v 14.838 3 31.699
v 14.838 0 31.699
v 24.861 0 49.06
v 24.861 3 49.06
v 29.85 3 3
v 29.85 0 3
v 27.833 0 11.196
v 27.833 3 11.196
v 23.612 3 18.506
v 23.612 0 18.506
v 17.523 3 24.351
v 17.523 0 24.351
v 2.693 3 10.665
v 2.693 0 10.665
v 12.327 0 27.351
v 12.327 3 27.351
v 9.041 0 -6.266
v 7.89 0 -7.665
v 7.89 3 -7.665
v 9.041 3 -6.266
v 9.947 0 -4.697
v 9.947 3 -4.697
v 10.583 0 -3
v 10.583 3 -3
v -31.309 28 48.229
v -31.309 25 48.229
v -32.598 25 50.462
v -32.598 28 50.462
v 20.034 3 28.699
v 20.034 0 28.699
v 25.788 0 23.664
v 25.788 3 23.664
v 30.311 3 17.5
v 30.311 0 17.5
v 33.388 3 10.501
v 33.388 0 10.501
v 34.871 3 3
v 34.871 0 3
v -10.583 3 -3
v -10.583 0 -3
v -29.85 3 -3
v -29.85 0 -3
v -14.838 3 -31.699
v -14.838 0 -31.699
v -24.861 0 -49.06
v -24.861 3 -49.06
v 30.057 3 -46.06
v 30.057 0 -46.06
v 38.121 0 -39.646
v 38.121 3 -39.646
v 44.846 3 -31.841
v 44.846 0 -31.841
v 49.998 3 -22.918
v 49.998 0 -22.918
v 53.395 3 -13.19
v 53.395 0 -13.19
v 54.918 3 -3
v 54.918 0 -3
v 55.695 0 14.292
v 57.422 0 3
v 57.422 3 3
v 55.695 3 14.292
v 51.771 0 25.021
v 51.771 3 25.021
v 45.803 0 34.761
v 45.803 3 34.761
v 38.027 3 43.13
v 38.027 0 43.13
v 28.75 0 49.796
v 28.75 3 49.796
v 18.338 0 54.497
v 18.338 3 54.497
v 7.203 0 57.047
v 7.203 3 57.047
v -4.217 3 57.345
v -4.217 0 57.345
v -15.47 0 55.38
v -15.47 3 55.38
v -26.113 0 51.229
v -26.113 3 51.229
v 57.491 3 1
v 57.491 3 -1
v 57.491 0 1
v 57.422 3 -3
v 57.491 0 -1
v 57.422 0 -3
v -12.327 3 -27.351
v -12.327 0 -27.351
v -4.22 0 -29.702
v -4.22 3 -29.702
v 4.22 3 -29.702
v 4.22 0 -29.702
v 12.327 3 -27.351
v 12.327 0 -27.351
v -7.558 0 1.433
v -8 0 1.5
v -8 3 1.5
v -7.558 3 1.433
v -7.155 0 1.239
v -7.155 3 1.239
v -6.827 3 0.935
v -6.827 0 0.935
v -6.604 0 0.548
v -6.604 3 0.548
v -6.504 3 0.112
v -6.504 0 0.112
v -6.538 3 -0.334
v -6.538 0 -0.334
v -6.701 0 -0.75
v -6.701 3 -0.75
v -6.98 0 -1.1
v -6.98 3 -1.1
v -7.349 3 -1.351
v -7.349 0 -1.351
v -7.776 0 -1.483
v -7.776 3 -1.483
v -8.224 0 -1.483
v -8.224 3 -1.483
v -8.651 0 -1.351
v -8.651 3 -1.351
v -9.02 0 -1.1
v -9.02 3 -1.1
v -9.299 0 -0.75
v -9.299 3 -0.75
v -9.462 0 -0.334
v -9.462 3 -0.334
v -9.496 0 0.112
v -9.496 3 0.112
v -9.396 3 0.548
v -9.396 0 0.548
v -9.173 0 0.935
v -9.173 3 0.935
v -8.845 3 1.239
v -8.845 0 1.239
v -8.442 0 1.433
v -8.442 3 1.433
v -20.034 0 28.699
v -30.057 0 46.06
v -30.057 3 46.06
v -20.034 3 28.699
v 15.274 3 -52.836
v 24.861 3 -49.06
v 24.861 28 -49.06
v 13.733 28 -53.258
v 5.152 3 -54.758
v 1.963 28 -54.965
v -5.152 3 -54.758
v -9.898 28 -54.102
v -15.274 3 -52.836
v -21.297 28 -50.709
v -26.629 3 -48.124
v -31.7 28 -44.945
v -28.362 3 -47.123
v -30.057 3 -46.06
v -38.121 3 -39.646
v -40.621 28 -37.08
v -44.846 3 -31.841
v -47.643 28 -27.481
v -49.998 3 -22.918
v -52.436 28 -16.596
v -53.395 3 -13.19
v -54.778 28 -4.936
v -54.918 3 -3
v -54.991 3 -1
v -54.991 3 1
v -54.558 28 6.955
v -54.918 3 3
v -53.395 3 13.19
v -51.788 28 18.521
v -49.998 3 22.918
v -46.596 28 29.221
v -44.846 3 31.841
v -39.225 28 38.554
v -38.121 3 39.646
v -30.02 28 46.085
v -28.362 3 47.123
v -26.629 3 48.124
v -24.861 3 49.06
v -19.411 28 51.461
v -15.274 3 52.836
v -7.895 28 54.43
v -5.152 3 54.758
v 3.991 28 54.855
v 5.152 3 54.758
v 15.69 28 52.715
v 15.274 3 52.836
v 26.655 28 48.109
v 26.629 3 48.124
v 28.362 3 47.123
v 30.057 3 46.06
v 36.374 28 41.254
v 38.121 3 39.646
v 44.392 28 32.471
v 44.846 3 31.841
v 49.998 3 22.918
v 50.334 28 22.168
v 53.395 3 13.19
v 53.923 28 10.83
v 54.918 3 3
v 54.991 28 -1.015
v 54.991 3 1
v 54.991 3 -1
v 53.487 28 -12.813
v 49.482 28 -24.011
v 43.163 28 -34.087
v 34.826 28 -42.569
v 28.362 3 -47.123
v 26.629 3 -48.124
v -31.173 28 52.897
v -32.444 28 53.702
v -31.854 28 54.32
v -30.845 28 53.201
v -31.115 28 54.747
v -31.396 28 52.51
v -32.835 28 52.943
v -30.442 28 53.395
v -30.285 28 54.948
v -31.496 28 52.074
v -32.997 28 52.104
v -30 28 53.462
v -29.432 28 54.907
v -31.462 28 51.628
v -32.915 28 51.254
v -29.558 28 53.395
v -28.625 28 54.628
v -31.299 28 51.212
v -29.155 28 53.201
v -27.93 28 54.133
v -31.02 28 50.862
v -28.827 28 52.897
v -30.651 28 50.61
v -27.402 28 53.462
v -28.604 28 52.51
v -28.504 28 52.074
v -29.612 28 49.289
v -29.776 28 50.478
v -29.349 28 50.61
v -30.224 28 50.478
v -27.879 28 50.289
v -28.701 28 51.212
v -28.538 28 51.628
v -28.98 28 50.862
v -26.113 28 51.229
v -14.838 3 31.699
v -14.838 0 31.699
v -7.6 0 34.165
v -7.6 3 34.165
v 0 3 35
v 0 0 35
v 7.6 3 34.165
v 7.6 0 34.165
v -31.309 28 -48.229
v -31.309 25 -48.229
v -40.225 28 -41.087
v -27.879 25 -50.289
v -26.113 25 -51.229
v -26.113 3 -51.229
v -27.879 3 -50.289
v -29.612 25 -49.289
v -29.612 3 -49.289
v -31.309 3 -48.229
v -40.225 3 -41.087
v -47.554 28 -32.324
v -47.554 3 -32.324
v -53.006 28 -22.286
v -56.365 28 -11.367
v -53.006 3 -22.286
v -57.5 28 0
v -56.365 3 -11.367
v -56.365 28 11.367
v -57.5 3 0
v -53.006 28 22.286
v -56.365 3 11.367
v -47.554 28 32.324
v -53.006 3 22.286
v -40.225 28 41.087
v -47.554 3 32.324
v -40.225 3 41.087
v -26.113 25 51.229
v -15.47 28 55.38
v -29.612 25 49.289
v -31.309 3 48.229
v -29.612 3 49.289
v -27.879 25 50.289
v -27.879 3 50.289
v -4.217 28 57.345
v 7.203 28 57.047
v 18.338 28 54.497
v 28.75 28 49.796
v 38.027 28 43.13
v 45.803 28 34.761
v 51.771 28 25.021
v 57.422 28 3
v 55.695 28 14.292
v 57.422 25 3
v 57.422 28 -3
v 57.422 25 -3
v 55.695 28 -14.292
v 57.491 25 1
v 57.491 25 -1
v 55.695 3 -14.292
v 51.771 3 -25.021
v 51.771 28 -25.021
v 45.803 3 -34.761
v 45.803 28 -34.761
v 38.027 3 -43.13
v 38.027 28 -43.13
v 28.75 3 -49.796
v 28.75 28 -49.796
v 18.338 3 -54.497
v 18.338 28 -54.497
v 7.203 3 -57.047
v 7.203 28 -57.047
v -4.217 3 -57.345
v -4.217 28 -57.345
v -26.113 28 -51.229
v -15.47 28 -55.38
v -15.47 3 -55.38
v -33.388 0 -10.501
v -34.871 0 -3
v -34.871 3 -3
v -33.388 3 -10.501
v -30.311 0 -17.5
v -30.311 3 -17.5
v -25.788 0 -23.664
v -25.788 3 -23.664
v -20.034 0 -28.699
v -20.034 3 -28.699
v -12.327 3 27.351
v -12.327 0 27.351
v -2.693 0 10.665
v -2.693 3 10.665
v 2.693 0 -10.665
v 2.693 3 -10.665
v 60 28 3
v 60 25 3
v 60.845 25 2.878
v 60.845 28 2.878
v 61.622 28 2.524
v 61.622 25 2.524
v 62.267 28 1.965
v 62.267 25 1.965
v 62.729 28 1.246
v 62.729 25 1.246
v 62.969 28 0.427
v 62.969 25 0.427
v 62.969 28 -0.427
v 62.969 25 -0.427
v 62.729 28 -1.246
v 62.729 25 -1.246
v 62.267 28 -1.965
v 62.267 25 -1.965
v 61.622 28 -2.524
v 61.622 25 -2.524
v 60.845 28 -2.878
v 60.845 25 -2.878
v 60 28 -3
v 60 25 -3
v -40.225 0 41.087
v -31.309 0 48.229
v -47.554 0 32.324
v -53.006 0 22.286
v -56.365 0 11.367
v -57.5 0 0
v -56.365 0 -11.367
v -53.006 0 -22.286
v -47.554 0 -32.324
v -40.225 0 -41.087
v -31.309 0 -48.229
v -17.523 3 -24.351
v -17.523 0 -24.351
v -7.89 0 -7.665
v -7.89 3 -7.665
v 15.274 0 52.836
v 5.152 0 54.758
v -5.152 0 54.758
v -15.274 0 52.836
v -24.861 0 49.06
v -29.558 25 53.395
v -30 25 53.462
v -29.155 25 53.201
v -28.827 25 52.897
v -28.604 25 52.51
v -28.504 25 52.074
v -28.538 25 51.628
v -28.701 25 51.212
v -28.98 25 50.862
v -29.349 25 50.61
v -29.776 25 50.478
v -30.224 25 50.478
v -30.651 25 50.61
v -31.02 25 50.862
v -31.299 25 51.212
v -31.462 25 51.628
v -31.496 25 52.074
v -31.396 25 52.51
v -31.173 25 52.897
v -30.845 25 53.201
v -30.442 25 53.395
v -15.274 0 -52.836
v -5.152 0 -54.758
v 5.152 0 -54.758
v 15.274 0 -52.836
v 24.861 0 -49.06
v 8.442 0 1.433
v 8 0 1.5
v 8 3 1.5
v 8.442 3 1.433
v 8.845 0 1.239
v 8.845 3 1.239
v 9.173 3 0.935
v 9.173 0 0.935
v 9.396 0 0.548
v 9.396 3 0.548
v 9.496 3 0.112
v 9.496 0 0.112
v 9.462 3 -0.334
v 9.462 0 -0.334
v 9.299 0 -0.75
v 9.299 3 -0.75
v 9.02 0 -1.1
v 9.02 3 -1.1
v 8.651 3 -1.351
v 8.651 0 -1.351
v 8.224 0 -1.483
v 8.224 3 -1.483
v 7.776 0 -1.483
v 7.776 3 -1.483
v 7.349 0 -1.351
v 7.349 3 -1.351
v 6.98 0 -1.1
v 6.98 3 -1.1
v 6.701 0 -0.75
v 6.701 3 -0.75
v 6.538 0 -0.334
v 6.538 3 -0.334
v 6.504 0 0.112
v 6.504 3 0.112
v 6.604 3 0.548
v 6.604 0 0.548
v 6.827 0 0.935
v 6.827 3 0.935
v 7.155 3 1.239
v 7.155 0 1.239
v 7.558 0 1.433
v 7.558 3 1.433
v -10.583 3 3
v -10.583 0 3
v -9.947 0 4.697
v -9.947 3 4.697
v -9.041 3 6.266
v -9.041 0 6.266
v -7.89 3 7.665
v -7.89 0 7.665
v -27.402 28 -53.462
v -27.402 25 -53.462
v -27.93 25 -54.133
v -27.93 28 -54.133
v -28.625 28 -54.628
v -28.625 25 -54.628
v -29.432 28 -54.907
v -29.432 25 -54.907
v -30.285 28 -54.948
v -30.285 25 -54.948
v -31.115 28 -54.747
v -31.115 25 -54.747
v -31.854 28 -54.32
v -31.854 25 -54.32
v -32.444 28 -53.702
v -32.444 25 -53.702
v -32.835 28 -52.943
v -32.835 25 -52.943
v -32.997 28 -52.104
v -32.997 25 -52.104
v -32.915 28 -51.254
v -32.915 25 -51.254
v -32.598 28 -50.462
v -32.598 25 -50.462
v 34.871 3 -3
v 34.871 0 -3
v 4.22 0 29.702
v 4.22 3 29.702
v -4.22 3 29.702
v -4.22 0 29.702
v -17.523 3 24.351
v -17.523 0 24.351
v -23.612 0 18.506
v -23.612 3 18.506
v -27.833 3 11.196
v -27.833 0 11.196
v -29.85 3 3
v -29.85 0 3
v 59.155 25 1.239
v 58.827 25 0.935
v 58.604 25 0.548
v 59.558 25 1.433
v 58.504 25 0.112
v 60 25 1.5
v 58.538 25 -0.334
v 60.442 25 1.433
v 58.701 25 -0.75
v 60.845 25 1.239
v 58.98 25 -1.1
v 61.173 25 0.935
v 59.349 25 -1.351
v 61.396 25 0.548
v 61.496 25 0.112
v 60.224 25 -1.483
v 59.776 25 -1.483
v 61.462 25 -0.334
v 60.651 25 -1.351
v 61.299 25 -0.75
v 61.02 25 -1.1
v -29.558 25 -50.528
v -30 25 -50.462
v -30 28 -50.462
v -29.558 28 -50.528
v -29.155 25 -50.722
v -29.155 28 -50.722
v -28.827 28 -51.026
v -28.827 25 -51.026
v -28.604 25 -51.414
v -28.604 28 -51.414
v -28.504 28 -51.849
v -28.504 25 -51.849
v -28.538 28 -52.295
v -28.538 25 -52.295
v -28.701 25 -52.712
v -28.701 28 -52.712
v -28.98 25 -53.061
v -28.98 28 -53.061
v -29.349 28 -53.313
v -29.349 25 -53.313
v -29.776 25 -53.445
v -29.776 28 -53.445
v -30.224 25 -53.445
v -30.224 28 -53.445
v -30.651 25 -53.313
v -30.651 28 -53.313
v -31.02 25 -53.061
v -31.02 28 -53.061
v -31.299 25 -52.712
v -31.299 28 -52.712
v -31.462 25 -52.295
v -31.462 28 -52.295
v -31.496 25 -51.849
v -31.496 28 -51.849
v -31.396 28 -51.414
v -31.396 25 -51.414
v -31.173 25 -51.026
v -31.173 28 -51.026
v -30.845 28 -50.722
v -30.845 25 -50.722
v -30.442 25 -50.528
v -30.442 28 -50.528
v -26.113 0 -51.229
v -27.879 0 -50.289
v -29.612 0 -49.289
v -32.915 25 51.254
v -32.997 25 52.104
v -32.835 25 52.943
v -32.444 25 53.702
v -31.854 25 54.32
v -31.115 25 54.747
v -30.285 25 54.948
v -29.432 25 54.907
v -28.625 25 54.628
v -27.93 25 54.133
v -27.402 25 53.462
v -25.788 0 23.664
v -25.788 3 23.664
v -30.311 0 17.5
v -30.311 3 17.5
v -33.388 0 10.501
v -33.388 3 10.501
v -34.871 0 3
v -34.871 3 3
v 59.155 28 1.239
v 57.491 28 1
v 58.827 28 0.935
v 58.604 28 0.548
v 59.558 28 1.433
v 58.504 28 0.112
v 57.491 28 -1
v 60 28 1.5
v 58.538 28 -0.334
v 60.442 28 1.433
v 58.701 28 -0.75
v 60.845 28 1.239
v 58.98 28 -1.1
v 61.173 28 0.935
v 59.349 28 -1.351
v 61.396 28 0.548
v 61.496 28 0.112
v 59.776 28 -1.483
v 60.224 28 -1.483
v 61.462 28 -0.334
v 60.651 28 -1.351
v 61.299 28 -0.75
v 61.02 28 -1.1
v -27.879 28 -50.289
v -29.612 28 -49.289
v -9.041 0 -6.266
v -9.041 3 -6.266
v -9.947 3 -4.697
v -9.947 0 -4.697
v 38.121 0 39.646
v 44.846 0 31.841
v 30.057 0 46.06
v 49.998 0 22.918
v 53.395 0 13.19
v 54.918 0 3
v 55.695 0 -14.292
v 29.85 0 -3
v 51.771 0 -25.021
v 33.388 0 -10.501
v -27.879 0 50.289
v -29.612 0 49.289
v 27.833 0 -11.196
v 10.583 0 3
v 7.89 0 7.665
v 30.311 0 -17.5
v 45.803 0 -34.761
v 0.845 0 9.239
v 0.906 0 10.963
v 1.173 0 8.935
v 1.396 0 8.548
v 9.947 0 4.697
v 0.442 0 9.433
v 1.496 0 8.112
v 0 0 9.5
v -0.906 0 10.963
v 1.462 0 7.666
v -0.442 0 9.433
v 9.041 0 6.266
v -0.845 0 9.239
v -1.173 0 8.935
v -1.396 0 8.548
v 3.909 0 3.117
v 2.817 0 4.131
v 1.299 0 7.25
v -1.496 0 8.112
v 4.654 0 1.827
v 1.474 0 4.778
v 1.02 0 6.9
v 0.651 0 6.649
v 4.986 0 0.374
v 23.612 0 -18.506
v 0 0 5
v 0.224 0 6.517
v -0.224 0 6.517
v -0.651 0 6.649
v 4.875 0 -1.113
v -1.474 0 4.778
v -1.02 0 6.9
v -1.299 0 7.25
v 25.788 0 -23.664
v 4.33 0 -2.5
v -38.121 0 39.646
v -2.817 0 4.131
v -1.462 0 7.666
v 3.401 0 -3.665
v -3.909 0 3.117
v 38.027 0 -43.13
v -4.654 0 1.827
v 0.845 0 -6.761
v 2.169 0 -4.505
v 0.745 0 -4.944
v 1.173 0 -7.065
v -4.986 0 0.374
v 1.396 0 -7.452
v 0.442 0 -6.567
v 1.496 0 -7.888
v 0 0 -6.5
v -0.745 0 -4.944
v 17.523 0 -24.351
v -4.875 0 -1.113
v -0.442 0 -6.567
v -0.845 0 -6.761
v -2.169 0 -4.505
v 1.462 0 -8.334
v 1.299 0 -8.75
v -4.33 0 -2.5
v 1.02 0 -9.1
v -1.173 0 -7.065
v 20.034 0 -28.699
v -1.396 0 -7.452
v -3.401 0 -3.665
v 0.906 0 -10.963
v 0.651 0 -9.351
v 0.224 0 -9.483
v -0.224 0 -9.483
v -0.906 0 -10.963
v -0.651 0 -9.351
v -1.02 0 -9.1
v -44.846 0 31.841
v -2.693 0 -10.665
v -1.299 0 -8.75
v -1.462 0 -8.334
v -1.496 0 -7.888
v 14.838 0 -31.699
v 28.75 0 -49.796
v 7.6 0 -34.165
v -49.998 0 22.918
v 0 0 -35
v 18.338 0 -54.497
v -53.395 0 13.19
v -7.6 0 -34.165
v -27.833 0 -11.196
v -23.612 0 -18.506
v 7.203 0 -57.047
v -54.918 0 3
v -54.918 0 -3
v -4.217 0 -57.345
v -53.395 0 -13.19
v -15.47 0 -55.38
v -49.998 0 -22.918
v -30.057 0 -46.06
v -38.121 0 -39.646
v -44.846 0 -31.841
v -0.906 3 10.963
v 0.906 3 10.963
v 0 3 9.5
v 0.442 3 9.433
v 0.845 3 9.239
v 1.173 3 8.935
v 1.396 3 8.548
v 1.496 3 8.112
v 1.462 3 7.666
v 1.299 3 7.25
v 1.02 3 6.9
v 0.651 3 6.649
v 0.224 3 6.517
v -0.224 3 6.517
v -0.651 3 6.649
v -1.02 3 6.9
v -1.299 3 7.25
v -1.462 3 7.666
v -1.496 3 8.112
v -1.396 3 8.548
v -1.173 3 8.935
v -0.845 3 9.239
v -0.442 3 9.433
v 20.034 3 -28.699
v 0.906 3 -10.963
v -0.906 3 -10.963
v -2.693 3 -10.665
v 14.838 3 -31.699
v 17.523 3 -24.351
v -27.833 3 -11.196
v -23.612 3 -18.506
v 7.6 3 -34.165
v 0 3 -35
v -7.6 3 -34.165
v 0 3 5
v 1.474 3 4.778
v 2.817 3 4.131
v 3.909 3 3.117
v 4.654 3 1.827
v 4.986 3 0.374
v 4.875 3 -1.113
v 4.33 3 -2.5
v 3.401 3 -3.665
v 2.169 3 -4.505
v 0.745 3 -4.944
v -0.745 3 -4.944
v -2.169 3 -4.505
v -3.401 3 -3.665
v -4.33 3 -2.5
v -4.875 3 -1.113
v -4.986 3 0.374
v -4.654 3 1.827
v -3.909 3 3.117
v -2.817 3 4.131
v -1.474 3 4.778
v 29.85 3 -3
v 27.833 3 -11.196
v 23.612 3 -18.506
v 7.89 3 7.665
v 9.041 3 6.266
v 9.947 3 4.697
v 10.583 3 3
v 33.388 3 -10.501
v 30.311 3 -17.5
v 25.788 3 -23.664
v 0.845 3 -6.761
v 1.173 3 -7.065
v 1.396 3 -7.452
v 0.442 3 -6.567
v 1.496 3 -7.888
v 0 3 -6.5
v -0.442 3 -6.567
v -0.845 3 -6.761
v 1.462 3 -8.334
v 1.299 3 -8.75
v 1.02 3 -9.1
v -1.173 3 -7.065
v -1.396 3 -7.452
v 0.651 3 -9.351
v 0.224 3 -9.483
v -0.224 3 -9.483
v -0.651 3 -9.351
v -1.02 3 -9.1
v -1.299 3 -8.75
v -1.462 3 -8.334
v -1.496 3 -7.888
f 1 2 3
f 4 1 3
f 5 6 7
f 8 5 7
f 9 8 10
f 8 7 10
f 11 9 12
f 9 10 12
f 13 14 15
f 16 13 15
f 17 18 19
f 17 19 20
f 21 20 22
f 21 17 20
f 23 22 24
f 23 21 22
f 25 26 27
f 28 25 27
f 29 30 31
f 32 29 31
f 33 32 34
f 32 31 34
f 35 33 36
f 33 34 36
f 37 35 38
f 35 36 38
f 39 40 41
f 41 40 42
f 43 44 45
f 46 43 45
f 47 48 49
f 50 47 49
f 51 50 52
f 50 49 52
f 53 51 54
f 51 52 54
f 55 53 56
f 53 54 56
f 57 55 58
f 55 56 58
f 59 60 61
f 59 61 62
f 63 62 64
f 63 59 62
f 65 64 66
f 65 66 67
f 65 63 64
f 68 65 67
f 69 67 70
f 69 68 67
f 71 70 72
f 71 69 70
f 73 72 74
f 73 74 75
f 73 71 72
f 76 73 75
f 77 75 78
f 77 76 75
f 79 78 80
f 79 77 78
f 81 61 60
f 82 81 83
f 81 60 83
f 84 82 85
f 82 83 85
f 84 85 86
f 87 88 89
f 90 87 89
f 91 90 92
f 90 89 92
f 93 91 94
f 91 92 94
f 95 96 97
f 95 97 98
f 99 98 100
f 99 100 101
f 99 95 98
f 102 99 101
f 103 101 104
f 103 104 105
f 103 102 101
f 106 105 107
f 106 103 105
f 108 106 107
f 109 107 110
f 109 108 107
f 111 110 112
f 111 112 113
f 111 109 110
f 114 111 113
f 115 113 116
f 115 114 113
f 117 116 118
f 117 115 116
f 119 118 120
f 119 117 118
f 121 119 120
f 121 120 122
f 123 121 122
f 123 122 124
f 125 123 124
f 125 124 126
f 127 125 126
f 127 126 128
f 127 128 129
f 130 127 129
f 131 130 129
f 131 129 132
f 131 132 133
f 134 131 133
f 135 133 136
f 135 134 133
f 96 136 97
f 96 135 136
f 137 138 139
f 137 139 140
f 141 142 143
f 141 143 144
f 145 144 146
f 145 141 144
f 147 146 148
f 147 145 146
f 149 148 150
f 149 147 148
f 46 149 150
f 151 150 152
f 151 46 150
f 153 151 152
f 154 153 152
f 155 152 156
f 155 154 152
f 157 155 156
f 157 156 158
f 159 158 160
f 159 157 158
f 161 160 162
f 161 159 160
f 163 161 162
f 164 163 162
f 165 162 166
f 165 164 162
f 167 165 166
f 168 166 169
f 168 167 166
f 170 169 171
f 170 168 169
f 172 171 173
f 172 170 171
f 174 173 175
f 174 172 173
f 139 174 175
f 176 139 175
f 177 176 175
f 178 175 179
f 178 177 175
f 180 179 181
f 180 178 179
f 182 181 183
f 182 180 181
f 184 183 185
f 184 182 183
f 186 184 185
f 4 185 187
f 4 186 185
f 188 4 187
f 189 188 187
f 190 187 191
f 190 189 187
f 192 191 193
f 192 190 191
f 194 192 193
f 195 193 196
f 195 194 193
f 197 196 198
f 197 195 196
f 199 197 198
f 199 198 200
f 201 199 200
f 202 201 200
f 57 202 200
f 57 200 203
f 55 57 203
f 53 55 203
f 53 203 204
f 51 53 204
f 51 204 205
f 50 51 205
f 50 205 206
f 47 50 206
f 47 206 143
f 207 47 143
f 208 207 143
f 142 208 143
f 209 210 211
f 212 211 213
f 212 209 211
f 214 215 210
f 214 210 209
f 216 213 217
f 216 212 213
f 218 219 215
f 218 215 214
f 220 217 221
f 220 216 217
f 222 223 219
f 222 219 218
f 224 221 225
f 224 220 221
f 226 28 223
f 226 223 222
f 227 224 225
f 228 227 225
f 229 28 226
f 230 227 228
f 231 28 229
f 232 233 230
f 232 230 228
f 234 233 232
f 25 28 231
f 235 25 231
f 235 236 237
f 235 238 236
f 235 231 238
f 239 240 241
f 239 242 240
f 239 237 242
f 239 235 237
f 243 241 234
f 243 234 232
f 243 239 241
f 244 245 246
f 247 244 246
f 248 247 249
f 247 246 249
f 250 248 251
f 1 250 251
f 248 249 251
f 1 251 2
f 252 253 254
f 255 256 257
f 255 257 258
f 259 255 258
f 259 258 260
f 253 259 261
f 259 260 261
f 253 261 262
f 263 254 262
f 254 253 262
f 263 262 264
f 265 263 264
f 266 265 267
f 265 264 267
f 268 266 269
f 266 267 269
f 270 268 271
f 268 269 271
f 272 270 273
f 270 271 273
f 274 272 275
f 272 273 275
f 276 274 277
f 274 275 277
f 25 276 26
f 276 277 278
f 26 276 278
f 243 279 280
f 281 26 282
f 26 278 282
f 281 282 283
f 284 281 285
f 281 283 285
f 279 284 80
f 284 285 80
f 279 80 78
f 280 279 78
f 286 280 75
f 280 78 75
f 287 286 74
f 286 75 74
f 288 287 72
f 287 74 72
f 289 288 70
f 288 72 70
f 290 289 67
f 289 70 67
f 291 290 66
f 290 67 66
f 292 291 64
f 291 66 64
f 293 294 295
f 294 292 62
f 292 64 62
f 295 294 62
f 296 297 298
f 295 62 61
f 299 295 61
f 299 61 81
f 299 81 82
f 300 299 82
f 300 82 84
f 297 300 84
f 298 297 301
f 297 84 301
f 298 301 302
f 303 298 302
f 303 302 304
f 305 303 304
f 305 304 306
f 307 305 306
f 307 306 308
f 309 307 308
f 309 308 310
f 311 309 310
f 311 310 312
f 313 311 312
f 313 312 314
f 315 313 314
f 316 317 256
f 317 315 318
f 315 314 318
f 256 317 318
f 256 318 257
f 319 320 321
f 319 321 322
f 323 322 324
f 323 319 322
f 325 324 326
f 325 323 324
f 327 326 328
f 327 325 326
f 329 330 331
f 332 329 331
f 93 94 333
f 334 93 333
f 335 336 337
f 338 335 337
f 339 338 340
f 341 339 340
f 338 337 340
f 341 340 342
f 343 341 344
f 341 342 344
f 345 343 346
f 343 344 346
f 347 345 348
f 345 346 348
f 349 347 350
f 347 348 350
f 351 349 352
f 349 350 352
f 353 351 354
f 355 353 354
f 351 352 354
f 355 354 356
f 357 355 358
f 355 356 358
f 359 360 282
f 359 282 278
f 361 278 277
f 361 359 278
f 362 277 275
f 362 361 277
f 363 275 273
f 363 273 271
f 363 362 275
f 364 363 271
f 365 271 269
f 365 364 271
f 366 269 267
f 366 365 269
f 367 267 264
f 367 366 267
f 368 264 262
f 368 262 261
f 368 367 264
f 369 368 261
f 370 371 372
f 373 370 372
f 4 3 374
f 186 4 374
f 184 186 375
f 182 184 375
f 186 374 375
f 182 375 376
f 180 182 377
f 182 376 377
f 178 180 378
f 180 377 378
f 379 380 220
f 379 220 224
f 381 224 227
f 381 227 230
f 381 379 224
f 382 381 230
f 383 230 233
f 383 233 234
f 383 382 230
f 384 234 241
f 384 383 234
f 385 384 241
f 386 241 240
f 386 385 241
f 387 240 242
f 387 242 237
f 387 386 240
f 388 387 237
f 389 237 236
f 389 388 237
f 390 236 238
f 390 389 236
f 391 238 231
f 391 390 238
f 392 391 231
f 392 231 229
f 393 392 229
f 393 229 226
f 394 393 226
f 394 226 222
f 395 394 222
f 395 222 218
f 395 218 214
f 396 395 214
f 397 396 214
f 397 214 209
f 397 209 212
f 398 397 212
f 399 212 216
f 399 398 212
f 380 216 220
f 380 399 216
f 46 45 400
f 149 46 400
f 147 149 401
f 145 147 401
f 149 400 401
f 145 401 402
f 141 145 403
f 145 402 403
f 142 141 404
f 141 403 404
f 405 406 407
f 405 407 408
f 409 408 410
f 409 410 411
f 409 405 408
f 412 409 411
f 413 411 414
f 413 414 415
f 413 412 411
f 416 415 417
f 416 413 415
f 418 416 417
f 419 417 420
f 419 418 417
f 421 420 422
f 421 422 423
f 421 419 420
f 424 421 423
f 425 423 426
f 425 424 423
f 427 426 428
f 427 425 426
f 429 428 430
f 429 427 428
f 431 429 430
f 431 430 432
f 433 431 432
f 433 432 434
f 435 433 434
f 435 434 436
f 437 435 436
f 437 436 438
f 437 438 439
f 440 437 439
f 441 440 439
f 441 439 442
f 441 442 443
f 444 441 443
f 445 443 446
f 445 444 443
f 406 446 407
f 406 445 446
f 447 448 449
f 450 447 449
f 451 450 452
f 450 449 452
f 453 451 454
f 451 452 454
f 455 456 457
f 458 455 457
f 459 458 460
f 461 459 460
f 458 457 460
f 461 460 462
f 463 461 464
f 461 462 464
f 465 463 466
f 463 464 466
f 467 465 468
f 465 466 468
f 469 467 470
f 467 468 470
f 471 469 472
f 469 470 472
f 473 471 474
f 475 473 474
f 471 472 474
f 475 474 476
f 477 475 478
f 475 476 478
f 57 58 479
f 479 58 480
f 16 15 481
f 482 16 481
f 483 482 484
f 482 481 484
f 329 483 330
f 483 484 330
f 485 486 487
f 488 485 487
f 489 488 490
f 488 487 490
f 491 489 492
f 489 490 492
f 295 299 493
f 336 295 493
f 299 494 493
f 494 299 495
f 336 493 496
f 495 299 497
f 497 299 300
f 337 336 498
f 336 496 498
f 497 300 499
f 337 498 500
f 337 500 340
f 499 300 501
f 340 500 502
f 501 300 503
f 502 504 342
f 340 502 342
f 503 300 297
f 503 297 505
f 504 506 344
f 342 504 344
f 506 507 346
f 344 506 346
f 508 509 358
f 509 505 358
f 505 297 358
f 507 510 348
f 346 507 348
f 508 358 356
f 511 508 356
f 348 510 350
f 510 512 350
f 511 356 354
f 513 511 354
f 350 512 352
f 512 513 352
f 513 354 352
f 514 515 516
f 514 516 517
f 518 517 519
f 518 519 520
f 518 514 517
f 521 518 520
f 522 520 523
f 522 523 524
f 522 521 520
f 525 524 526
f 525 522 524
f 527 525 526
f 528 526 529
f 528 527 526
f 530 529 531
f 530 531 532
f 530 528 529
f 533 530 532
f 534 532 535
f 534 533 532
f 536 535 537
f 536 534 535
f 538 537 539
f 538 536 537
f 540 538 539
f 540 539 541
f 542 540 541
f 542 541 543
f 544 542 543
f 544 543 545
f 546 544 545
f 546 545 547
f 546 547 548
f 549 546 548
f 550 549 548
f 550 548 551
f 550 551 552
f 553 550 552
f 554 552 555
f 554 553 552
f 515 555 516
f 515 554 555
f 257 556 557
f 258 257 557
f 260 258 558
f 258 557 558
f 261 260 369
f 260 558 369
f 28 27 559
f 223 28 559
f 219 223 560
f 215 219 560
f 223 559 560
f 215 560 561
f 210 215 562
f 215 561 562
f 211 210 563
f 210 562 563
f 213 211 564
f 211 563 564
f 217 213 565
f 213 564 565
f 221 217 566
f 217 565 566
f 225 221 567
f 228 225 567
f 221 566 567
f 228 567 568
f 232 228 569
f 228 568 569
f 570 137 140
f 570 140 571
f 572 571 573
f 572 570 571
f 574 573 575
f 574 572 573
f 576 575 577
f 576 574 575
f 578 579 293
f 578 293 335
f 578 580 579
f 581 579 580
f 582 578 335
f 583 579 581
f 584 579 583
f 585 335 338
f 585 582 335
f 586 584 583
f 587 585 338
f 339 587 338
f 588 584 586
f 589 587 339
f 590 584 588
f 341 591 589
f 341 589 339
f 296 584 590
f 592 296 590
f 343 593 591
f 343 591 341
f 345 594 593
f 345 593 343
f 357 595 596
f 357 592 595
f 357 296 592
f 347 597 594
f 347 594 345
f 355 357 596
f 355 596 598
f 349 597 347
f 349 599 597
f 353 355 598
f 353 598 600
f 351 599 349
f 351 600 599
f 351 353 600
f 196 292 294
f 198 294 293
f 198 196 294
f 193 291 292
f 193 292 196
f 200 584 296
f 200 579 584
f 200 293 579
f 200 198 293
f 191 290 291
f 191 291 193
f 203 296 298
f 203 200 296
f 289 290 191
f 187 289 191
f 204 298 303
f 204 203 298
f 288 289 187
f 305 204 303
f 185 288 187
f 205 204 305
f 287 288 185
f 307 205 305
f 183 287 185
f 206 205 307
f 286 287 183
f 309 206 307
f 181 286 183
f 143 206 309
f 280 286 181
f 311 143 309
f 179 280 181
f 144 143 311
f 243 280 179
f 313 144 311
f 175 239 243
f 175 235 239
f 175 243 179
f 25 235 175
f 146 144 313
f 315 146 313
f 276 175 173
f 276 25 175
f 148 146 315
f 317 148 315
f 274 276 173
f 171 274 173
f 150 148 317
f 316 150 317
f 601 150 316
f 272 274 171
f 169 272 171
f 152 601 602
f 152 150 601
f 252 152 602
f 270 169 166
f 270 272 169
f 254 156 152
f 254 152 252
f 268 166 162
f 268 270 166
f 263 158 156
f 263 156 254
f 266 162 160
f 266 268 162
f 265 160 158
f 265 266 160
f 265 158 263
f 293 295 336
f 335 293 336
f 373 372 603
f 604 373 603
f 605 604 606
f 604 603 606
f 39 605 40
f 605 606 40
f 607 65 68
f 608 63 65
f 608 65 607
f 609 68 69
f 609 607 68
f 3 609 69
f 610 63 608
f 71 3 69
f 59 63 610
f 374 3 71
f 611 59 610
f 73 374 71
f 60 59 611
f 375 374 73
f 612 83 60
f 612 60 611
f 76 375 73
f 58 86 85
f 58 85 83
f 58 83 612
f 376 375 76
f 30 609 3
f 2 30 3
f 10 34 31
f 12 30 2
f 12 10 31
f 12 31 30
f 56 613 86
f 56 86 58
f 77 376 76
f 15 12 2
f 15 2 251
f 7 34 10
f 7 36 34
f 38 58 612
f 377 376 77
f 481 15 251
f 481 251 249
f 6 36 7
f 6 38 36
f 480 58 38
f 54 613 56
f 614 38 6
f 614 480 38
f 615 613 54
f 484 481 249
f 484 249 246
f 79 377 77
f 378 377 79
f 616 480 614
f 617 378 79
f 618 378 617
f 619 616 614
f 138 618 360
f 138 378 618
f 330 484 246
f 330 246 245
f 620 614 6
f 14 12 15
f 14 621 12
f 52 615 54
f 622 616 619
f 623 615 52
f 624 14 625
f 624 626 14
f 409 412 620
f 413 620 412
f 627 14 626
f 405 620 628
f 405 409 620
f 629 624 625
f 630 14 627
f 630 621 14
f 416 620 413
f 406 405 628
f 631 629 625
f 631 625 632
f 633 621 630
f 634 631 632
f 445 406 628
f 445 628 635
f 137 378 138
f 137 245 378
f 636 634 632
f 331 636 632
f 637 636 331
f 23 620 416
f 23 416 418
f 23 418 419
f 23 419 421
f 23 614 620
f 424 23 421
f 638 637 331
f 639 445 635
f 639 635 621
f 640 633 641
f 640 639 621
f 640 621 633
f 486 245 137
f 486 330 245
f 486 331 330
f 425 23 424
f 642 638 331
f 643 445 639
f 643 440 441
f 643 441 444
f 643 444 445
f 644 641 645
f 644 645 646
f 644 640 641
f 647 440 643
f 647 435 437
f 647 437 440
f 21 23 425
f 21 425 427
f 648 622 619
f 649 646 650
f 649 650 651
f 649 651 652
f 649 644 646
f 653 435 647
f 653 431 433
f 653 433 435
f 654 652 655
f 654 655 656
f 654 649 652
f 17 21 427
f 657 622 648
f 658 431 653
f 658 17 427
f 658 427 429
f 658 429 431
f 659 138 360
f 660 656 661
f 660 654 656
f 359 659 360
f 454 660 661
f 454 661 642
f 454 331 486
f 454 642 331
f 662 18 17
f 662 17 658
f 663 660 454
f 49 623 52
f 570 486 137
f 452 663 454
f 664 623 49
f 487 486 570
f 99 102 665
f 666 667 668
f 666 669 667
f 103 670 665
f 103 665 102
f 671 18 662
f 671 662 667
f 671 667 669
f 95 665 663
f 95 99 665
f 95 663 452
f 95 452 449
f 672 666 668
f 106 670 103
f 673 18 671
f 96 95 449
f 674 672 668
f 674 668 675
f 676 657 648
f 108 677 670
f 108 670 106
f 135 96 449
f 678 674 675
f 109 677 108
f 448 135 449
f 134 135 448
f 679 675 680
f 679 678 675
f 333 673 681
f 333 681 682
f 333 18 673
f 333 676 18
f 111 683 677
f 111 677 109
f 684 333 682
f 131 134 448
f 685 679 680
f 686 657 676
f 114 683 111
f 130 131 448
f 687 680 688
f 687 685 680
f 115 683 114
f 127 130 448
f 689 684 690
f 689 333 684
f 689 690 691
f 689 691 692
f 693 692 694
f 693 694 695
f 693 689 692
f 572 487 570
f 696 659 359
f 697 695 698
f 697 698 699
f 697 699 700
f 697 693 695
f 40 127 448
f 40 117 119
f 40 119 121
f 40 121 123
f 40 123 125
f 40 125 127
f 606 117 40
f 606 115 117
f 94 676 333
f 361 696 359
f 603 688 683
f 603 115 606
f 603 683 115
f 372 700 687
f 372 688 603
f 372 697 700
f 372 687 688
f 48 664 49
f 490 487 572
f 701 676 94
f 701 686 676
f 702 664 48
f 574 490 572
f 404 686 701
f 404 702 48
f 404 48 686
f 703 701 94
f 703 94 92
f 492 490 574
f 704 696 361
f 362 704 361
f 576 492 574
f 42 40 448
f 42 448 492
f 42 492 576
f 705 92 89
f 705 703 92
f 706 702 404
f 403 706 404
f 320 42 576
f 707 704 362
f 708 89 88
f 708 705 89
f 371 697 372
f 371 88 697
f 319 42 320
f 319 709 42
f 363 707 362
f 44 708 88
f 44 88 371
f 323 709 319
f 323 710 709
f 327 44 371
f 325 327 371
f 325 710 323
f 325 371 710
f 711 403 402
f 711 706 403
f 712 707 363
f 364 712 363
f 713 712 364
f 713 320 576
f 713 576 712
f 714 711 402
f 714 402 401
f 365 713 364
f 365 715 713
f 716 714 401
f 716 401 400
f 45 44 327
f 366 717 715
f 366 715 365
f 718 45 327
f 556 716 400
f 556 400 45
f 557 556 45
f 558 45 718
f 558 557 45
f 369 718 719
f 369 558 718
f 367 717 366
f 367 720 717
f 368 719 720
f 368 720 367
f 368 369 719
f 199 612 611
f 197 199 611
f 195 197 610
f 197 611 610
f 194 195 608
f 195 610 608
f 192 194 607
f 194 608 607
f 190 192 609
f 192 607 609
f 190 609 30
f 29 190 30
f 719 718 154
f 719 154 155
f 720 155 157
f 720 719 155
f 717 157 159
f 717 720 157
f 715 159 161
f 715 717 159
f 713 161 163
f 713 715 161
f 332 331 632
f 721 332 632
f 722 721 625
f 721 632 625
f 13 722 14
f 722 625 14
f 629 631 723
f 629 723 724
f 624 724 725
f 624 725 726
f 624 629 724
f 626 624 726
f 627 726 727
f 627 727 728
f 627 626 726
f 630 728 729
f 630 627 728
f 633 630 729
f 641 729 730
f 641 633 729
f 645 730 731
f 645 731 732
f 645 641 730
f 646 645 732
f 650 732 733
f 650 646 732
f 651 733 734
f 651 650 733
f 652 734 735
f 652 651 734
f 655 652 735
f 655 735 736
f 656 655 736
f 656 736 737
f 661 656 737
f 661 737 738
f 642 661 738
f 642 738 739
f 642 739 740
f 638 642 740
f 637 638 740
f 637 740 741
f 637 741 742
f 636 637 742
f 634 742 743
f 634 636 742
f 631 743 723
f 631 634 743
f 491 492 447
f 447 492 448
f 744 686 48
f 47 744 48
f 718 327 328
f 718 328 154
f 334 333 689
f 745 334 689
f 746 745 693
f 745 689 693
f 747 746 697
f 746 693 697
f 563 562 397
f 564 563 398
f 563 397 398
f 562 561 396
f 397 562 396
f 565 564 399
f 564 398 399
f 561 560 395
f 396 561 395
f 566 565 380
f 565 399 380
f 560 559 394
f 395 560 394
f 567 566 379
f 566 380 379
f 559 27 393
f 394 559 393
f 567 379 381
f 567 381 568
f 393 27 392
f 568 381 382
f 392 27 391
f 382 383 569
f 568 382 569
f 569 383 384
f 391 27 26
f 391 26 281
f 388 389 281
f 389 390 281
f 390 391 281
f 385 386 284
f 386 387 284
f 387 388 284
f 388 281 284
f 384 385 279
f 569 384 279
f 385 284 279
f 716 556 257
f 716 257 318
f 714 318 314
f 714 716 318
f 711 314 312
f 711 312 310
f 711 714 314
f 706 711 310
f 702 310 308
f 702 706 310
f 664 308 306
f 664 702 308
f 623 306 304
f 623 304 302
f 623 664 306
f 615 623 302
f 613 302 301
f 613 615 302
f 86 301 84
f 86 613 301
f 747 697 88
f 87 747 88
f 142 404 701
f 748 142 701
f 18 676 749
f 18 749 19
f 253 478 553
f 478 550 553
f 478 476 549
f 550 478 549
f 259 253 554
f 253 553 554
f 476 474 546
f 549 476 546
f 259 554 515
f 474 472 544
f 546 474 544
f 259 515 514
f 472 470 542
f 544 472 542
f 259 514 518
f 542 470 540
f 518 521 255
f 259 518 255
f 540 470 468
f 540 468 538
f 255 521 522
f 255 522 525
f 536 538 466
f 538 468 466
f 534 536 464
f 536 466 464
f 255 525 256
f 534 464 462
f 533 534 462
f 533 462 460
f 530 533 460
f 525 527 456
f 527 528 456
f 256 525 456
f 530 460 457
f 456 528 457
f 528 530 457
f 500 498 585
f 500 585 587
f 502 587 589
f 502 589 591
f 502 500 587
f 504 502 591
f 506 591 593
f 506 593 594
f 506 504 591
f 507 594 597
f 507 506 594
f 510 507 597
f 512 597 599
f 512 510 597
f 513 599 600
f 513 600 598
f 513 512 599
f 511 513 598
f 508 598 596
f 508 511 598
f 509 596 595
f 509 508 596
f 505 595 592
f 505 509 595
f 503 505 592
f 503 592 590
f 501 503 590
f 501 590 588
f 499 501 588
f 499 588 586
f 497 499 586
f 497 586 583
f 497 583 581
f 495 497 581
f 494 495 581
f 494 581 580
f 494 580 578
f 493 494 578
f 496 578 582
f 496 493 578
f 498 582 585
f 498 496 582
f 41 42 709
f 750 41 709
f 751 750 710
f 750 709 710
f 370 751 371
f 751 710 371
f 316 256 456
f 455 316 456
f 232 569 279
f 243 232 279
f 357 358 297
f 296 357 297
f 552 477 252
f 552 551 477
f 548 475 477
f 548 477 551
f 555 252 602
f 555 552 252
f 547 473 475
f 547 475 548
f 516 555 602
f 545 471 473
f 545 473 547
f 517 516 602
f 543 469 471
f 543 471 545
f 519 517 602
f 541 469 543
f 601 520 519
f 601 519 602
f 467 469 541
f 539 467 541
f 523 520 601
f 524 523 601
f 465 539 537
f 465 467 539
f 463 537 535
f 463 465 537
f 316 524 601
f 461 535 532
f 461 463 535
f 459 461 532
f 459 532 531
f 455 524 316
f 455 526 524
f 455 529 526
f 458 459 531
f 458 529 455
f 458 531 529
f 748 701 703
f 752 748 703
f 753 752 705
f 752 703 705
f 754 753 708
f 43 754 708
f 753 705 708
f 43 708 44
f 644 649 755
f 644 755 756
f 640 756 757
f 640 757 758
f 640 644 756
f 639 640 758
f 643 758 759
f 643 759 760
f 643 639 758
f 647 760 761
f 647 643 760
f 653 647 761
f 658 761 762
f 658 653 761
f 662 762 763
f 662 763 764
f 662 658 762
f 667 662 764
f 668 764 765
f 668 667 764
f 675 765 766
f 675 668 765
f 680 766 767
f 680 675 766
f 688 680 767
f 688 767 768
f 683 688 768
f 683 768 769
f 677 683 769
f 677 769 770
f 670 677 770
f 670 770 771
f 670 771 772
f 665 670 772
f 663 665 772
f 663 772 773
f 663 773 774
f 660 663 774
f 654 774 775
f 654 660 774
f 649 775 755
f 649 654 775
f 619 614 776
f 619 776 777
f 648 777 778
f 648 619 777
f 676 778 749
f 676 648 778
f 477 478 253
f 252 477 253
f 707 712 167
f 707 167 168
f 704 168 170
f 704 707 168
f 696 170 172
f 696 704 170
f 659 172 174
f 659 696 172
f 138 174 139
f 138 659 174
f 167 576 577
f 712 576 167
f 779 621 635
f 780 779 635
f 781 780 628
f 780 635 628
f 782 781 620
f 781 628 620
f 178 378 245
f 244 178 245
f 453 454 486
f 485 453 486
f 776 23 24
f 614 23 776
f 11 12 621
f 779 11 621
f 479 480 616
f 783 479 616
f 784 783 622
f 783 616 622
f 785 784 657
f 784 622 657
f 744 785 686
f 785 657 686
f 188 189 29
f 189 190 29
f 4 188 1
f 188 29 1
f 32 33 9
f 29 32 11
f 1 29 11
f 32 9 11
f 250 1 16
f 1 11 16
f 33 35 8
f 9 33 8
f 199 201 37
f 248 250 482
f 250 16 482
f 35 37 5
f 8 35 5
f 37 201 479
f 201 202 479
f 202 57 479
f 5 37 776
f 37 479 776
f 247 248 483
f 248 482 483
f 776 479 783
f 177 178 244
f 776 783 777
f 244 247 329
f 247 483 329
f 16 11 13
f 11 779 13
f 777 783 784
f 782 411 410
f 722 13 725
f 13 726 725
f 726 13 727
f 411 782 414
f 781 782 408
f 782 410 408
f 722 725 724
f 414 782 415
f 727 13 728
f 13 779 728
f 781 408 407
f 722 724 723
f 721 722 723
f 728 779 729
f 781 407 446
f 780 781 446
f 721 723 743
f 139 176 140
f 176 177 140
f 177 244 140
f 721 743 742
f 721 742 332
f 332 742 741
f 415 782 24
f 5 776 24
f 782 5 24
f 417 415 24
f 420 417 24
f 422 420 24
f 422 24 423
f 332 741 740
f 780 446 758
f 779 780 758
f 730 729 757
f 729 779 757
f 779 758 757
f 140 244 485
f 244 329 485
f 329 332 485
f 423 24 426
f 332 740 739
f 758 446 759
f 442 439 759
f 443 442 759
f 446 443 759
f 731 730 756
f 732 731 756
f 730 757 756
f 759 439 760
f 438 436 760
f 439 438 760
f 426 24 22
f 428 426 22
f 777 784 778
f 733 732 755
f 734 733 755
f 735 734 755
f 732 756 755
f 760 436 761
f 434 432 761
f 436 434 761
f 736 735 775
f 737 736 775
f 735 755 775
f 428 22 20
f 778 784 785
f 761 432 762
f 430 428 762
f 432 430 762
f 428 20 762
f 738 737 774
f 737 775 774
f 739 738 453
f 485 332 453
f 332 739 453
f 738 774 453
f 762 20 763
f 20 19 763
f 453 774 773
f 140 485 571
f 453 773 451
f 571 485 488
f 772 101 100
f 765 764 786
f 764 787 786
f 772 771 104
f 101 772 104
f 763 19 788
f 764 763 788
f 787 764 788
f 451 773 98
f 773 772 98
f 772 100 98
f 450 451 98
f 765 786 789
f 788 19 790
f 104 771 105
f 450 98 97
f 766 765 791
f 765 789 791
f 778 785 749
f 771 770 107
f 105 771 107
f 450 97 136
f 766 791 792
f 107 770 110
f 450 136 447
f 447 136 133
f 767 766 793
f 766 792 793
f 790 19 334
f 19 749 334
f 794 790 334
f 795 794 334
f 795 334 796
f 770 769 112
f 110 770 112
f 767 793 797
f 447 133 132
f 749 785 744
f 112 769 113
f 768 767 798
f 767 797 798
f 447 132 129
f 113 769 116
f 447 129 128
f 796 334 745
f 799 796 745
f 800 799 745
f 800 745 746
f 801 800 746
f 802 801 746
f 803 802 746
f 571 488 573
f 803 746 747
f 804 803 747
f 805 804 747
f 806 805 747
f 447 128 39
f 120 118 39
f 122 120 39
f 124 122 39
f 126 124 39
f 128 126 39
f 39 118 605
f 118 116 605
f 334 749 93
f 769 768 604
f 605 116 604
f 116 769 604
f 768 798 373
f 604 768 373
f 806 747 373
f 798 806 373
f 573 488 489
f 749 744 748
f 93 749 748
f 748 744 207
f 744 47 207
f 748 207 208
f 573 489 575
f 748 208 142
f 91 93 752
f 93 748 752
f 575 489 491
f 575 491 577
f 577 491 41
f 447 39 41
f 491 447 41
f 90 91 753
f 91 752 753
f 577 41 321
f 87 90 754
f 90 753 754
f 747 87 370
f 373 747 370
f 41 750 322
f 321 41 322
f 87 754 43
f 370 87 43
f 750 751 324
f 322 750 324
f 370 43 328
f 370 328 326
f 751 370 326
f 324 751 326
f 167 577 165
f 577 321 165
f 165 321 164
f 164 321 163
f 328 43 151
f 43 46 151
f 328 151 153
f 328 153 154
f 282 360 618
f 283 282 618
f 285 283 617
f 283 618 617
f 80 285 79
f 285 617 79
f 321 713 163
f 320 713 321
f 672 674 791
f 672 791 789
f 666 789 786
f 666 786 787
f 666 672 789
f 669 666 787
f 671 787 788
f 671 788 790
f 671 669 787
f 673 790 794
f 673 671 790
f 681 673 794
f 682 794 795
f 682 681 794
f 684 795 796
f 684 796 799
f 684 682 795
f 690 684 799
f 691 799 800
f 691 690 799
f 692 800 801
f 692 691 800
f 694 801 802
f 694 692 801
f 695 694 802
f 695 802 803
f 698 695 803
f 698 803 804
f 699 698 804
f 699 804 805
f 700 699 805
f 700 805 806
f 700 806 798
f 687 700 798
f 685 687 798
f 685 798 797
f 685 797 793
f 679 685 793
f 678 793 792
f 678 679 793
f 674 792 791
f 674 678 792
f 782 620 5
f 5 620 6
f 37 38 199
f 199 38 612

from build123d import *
from build123d.topology import SkipClean

# Parameters (mm, degrees)
SKETCH_1_R          = 1.5
SKETCH_1_R_2        = 5
EXTRUDE_1_DEPTH     = 3
SKETCH_2_R          = 57.5
SKETCH_2_R_2        = 55
EXTRUDE_2_DEPTH     = 25
EXTRUDE_START       = -3
SKETCH_3_R          = 1.5
EXTRUDE_3_DEPTH     = 3
CUT_EXTRUDE_START   = -30
SKETCH_4_R          = 69.475087651
SKETCH_4_R_2        = 57.5
CUT_EXTRUDE_1_DEPTH = 30


with BuildPart() as part:
    # 草图1 → 凸台-拉伸1 (new body)
    with BuildSketch(Plane(origin=(0, 0, 0), x_dir=(1, 0, 0), z_dir=(0, 1, 0))):
        with BuildLine():
            Line((57.421685799, 3), (60, 3))
            ThreePointArc((60, 3), (63, 0), (60, -3))
            Line((60, -3), (57.421685799, -3))
            ThreePointArc((57.421685799, -3), (28.75, -49.796460718), (-26.112766688, -51.22863863))
            Line((-26.112766688, -51.22863863), (-27.401923789, -53.461524227))
            ThreePointArc((-27.401923789, -53.461524227), (-31.5, -54.559600438), (-32.598076211, -50.461524227))
            Line((-32.598076211, -50.461524227), (-31.308919111, -48.22863863))
            ThreePointArc((-31.308919111, -48.22863863), (-57.5, 0), (-31.308919111, 48.22863863))
            Line((-31.308919111, 48.22863863), (-32.598076211, 50.461524227))
            ThreePointArc((-32.598076211, 50.461524227), (-31.5, 54.559600438), (-27.401923789, 53.461524227))
            Line((-27.401923789, 53.461524227), (-26.112766688, 51.22863863))
            ThreePointArc((-26.112766688, 51.22863863), (28.75, 49.796460718), (57.421685799, 3))
        make_face()
        with Locations((0, 8)):
            Circle(SKETCH_1_R, mode=Mode.SUBTRACT)
        with Locations((8, 0)):
            Circle(SKETCH_1_R, mode=Mode.SUBTRACT)
        with Locations((0, -8)):
            Circle(SKETCH_1_R, mode=Mode.SUBTRACT)
        with Locations((-8, 0)):
            Circle(SKETCH_1_R, mode=Mode.SUBTRACT)
        Circle(SKETCH_1_R_2, mode=Mode.SUBTRACT)
        with Locations((60, 0)):
            Circle(SKETCH_1_R, mode=Mode.SUBTRACT)
        with Locations((-30, -51.961524227)):
            Circle(SKETCH_1_R, mode=Mode.SUBTRACT)
        with Locations((-30, 51.961524227)):
            Circle(SKETCH_1_R, mode=Mode.SUBTRACT)
        with BuildLine():
            Line((10.583005244, 3), (29.849623113, 3))
            ThreePointArc((29.849623113, 3), (25.980762114, 15), (17.522887768, 24.350531909))
            Line((17.522887768, 24.350531909), (7.889578833, 7.66515139))
            ThreePointArc((7.889578833, 7.66515139), (9.526279442, 5.5), (10.583005244, 3))
        make_face(mode=Mode.SUBTRACT)
        with BuildLine():
            Line((10.583005244, -3), (29.849623113, -3))
            ThreePointArc((29.849623113, -3), (25.980762114, -15), (17.522887768, -24.350531909))
            Line((17.522887768, -24.350531909), (7.889578833, -7.66515139))
            ThreePointArc((7.889578833, -7.66515139), (9.526279442, -5.5), (10.583005244, -3))
        make_face(mode=Mode.SUBTRACT)
        with BuildLine():
            Line((2.693426411, -10.66515139), (12.326735345, -27.350531909))
            ThreePointArc((12.326735345, -27.350531909), (0, -30), (-12.326735345, -27.350531909))
            Line((-12.326735345, -27.350531909), (-2.693426411, -10.66515139))
            ThreePointArc((-2.693426411, -10.66515139), (0, -11), (2.693426411, -10.66515139))
        make_face(mode=Mode.SUBTRACT)
        with BuildLine():
            Line((-14.837519563, 31.699337741), (-24.860984224, 49.060487802))
            ThreePointArc((-24.860984224, 49.060487802), (0, 55), (24.860984224, 49.060487802))
            Line((24.860984224, 49.060487802), (14.837519563, 31.699337741))
            ThreePointArc((14.837519563, 31.699337741), (0, 35), (-14.837519563, 31.699337741))
        make_face(mode=Mode.SUBTRACT)
        with BuildLine():
            Line((-7.889578833, -7.66515139), (-17.522887768, -24.350531909))
            ThreePointArc((-17.522887768, -24.350531909), (-25.980762114, -15), (-29.849623113, -3))
            Line((-29.849623113, -3), (-10.583005244, -3))
            ThreePointArc((-10.583005244, -3), (-9.526279442, -5.5), (-7.889578833, -7.66515139))
        make_face(mode=Mode.SUBTRACT)
        with BuildLine():
            Line((-10.583005244, 3), (-29.849623113, 3))
            ThreePointArc((-29.849623113, 3), (-25.980762114, 15), (-17.522887768, 24.350531909))
            Line((-17.522887768, 24.350531909), (-7.889578833, 7.66515139))
            ThreePointArc((-7.889578833, 7.66515139), (-9.526279442, 5.5), (-10.583005244, 3))
        make_face(mode=Mode.SUBTRACT)
        with BuildLine():
            Line((20.033671986, 28.699337741), (30.057136647, 46.060487802))
            ThreePointArc((30.057136647, 46.060487802), (47.631397208, 27.5), (54.918120871, 3))
            Line((54.918120871, 3), (34.871191548, 3))
            ThreePointArc((34.871191548, 3), (30.310889132, 17.5), (20.033671986, 28.699337741))
        make_face(mode=Mode.SUBTRACT)
        with BuildLine():
            Line((-20.033671986, 28.699337741), (-30.057136647, 46.060487802))
            ThreePointArc((-30.057136647, 46.060487802), (-47.631397208, 27.5), (-54.918120871, 3))
            Line((-54.918120871, 3), (-34.871191548, 3))
            ThreePointArc((-34.871191548, 3), (-30.310889132, 17.5), (-20.033671986, 28.699337741))
        make_face(mode=Mode.SUBTRACT)
        with BuildLine():
            Line((-2.693426411, 10.66515139), (-12.326735345, 27.350531909))
            ThreePointArc((-12.326735345, 27.350531909), (0, 30), (12.326735345, 27.350531909))
            Line((12.326735345, 27.350531909), (2.693426411, 10.66515139))
            ThreePointArc((2.693426411, 10.66515139), (0, 11), (-2.693426411, 10.66515139))
        make_face(mode=Mode.SUBTRACT)
        with BuildLine():
            Line((-34.871191548, -3), (-54.918120871, -3))
            ThreePointArc((-54.918120871, -3), (-47.631397208, -27.5), (-30.057136647, -46.060487802))
            Line((-30.057136647, -46.060487802), (-20.033671986, -28.699337741))
            ThreePointArc((-20.033671986, -28.699337741), (-30.310889132, -17.5), (-34.871191548, -3))
        make_face(mode=Mode.SUBTRACT)
        with BuildLine():
            Line((34.871191548, -3), (54.918120871, -3))
            ThreePointArc((54.918120871, -3), (47.631397208, -27.5), (30.057136647, -46.060487802))
            Line((30.057136647, -46.060487802), (20.033671986, -28.699337741))
            ThreePointArc((20.033671986, -28.699337741), (30.310889132, -17.5), (34.871191548, -3))
        make_face(mode=Mode.SUBTRACT)
        with BuildLine():
            Line((14.837519563, -31.699337741), (24.860984224, -49.060487802))
            ThreePointArc((24.860984224, -49.060487802), (0, -55), (-24.860984224, -49.060487802))
            Line((-24.860984224, -49.060487802), (-14.837519563, -31.699337741))
            ThreePointArc((-14.837519563, -31.699337741), (0, -35), (14.837519563, -31.699337741))
        make_face(mode=Mode.SUBTRACT)
    extrude(amount=EXTRUDE_1_DEPTH)

    # 草图2 → 凸台-拉伸2 (add)
    with SkipClean():  # the faces are left unmerged after this step: merging them gives an invalid solid
        with BuildSketch(Plane(origin=(0, 3, 0), x_dir=(1, 0, 0), z_dir=(0, 1, 0))):
            Circle(SKETCH_2_R)
            Circle(SKETCH_2_R_2, mode=Mode.SUBTRACT)
        extrude(amount=EXTRUDE_2_DEPTH)
    add(part.part.scale(1), mode=Mode.REPLACE)  # the faces are merged on a copy

    # 草图3 → 凸台-拉伸3 (add)
    # profile 1 of 3: a face of its own
    with SkipClean():  # the faces are left unmerged after this step: merging them gives an invalid solid
        with BuildSketch(Plane(origin=(0, 28, 0), x_dir=(1, 0, 0), z_dir=(0, 1, 0)).offset(EXTRUDE_START)):
            with BuildLine():
                Line((-32.598076211, 50.461524227), (-31.308919111, 48.22863863))
                ThreePointArc((-31.308919111, 48.22863863), (-28.75, 49.796460718), (-26.112766688, 51.22863863))
                Line((-26.112766688, 51.22863863), (-27.401923789, 53.461524227))
                ThreePointArc((-27.401923789, 53.461524227), (-31.5, 54.559600438), (-32.598076211, 50.461524227))
            make_face()
            with Locations((-30, 51.961524227)):
                Circle(SKETCH_3_R, mode=Mode.SUBTRACT)
        # profile 2 of 3: a face of its own
        with BuildSketch(Plane(origin=(0, 28, 0), x_dir=(1, 0, 0), z_dir=(0, 1, 0)).offset(EXTRUDE_START)):
            with BuildLine():
                Line((60, 3), (57.421685799, 3))
                ThreePointArc((57.421685799, 3), (57.5, 0), (57.421685799, -3))
                Line((57.421685799, -3), (60, -3))
                ThreePointArc((60, -3), (63, 0), (60, 3))
            make_face()
            with Locations((60, 0)):
                Circle(SKETCH_3_R, mode=Mode.SUBTRACT)
        # profile 3 of 3: a face of its own
        with BuildSketch(Plane(origin=(0, 28, 0), x_dir=(1, 0, 0), z_dir=(0, 1, 0)).offset(EXTRUDE_START)):
            with BuildLine():
                Line((-27.401923789, -53.461524227), (-26.112766688, -51.22863863))
                ThreePointArc((-26.112766688, -51.22863863), (-28.75, -49.796460718), (-31.308919111, -48.22863863))
                Line((-31.308919111, -48.22863863), (-32.598076211, -50.461524227))
                ThreePointArc((-32.598076211, -50.461524227), (-31.5, -54.559600438), (-27.401923789, -53.461524227))
            make_face()
            with Locations((-30, -51.961524227)):
                Circle(SKETCH_3_R, mode=Mode.SUBTRACT)
        extrude(amount=EXTRUDE_3_DEPTH)

    # 草图4 → 切除-拉伸1 (cut)
    with BuildSketch(Plane(origin=(0, 3, 0), x_dir=(1, 0, 0), z_dir=(0, 1, 0)).offset(CUT_EXTRUDE_START)):
        Circle(SKETCH_4_R)
        Circle(SKETCH_4_R_2, mode=Mode.SUBTRACT)
    extrude(amount=CUT_EXTRUDE_1_DEPTH, mode=Mode.SUBTRACT)


solid = part.part
